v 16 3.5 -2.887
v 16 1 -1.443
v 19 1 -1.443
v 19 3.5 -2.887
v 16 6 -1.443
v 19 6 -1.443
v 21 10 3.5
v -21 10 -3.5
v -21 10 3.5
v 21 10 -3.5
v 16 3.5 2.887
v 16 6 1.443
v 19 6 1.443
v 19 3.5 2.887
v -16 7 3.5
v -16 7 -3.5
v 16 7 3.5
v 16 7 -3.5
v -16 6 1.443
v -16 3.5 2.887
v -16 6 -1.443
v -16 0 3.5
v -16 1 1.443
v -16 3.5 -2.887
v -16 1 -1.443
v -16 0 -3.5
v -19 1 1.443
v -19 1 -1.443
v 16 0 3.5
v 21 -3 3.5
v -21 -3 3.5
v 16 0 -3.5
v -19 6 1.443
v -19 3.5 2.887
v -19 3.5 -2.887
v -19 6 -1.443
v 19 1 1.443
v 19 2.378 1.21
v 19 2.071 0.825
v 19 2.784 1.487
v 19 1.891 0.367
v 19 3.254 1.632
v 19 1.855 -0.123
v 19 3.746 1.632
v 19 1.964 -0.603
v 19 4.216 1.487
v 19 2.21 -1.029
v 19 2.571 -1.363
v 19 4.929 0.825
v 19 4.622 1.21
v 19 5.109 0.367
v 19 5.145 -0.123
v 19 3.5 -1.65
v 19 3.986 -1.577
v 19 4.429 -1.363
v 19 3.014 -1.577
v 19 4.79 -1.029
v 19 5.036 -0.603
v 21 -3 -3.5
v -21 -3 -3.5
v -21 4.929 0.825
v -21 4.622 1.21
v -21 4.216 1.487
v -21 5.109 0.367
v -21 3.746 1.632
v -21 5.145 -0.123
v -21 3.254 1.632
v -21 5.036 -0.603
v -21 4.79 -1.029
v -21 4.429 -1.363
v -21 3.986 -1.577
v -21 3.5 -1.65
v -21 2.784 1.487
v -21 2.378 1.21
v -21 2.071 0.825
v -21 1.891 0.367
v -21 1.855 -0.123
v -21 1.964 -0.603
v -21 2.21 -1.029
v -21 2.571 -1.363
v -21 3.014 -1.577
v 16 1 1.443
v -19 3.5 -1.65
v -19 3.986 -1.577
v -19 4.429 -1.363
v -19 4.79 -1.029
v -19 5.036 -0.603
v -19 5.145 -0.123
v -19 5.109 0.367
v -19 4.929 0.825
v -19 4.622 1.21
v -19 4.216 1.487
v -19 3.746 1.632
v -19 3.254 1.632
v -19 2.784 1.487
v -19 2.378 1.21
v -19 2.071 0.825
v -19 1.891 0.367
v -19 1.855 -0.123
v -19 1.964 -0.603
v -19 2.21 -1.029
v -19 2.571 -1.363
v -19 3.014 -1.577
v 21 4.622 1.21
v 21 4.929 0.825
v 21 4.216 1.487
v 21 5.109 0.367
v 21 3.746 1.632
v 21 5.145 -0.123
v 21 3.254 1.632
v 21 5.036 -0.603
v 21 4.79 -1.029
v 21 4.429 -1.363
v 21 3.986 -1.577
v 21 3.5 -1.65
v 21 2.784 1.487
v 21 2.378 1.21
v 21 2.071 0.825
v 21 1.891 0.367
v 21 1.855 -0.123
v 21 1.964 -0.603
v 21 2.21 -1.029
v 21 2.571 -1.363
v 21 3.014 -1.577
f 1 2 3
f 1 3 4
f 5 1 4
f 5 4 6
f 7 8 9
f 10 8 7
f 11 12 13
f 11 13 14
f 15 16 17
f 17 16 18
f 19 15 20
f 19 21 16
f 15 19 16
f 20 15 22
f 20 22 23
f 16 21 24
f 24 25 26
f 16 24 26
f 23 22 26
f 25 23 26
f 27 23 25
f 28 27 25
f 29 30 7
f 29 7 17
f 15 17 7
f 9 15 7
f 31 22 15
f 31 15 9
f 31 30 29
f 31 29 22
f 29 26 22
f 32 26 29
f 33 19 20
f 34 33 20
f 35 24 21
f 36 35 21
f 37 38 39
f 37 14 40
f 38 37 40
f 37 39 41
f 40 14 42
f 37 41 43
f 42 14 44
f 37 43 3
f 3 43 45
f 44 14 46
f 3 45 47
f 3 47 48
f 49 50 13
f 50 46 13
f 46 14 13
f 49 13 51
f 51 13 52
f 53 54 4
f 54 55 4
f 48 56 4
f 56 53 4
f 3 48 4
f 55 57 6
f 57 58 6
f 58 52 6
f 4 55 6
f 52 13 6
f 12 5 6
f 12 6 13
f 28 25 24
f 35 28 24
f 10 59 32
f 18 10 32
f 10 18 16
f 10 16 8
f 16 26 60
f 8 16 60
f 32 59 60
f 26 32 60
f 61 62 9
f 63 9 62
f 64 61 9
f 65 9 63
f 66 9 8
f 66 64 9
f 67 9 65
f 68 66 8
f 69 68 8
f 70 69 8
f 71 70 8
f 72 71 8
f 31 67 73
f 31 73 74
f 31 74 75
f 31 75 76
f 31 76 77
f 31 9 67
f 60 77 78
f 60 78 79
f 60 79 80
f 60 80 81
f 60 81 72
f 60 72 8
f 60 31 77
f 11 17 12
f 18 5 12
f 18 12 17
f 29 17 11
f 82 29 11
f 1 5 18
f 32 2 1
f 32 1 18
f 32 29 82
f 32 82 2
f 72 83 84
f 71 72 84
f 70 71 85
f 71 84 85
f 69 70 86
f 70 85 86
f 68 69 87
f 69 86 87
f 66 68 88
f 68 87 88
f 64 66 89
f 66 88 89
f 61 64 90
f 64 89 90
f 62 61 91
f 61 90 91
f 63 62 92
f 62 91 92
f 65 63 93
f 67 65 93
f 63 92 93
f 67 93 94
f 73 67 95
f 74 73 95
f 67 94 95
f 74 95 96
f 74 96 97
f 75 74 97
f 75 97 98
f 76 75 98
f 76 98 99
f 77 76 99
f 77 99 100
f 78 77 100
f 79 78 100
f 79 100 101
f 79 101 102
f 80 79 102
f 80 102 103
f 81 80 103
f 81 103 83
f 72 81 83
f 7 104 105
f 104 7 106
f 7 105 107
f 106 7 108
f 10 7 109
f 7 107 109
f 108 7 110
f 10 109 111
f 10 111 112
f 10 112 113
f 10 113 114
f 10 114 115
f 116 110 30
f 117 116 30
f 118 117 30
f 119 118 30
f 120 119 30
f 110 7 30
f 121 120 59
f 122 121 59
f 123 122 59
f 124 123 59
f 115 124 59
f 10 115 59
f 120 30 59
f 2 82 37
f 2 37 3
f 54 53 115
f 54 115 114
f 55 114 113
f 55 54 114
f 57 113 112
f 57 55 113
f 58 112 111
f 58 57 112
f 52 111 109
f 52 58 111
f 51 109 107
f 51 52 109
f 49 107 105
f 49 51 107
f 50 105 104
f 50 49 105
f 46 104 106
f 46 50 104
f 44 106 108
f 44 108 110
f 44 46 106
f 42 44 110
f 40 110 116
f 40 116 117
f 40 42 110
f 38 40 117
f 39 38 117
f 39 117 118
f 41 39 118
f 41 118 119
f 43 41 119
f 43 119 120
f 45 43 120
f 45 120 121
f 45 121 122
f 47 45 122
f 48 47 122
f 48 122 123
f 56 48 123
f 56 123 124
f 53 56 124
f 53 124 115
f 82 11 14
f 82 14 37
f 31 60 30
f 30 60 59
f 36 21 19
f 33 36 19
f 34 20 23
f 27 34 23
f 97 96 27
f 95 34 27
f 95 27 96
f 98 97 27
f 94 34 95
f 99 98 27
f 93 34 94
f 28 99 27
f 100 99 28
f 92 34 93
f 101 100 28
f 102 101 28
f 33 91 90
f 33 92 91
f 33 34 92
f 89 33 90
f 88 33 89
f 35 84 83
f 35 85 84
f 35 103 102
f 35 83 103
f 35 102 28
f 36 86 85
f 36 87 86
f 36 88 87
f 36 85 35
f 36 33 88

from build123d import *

# Parameters (mm, degrees)
SKETCH1_W           = 42
SKETCH1_H           = 7
BOSS_EXTRUDE1_DEPTH = 3
SKETCH3_W           = 5
SKETCH3_H           = 7
BOSS_EXTRUDE2_DEPTH = 7
CUT_EXTRUDE1_DEPTH  = 3
CUT_EXTRUDE2_REACH  = 42.758
SKETCH5_R           = 1.65


with BuildPart() as part:
    # Sketch1 → Boss-Extrude1 (new body)
    with BuildSketch(Plane(origin=(0, 0, 0), x_dir=(1, 0, 0), z_dir=(0, 1, 0))):
        Rectangle(SKETCH1_W, SKETCH1_H)
    boss_extrude1 = extrude(amount=-BOSS_EXTRUDE1_DEPTH)

    # Sketch3 → Boss-Extrude2 (add)
    with BuildSketch(Plane(origin=(0, 0, 0), x_dir=(1, 0, 0), z_dir=(0, 1, 0))):
        with Locations((-18.5, 0)):
            Rectangle(SKETCH3_W, SKETCH3_H)
    boss_extrude2 = extrude(amount=BOSS_EXTRUDE2_DEPTH)

    # Sketch4 → Cut-Extrude1 (cut)
    with BuildSketch(Plane(origin=(-16, 0, 0), x_dir=(0, 0, -1), z_dir=(1, 0, 0))):
        Polygon((1.443375673, 6), (-1.443375673, 6), (-2.886751346, 3.5), (-1.443375673, 1), (1.443375673, 1), (2.886751346, 3.5), align=None)
    cut_extrude1 = extrude(amount=-CUT_EXTRUDE1_DEPTH, mode=Mode.SUBTRACT)

    # Sketch5 → Cut-Extrude2 (cut, up to next)
    with BuildSketch(Plane(origin=(-19, 0, 0), x_dir=(0, 0, -1), z_dir=(1, 0, 0)), mode=Mode.PRIVATE) as cut_extrude2_sk1:
        with Locations((0, 3.5)):
            Circle(SKETCH5_R)
    cut_extrude2_tool1 = extrude(cut_extrude2_sk1.sketch, amount=-CUT_EXTRUDE2_REACH, mode=Mode.PRIVATE) & part.part
    cut_extrude2 = cut_extrude2_tool1.solids().sort_by_distance((-19, 3.5, 0))[0]
    add(cut_extrude2, mode=Mode.SUBTRACT)

    # Mirror3: Boss-Extrude1 across plane
    add(boss_extrude1.mirror(Plane.ZX.offset(3.5)))

    # Mirror4: Boss-Extrude2, Cut-Extrude1, Cut-Extrude2 across plane
    add(boss_extrude2.mirror(Plane(origin=(0, 0, 0), x_dir=(0, 0, 1), z_dir=(1, 0, 0))))
    add(cut_extrude1.mirror(Plane(origin=(0, 0, 0), x_dir=(0, 0, 1), z_dir=(1, 0, 0))), mode=Mode.SUBTRACT)
    add(cut_extrude2.mirror(Plane(origin=(0, 0, 0), x_dir=(0, 0, 1), z_dir=(1, 0, 0))), mode=Mode.SUBTRACT)


solid = part.part
